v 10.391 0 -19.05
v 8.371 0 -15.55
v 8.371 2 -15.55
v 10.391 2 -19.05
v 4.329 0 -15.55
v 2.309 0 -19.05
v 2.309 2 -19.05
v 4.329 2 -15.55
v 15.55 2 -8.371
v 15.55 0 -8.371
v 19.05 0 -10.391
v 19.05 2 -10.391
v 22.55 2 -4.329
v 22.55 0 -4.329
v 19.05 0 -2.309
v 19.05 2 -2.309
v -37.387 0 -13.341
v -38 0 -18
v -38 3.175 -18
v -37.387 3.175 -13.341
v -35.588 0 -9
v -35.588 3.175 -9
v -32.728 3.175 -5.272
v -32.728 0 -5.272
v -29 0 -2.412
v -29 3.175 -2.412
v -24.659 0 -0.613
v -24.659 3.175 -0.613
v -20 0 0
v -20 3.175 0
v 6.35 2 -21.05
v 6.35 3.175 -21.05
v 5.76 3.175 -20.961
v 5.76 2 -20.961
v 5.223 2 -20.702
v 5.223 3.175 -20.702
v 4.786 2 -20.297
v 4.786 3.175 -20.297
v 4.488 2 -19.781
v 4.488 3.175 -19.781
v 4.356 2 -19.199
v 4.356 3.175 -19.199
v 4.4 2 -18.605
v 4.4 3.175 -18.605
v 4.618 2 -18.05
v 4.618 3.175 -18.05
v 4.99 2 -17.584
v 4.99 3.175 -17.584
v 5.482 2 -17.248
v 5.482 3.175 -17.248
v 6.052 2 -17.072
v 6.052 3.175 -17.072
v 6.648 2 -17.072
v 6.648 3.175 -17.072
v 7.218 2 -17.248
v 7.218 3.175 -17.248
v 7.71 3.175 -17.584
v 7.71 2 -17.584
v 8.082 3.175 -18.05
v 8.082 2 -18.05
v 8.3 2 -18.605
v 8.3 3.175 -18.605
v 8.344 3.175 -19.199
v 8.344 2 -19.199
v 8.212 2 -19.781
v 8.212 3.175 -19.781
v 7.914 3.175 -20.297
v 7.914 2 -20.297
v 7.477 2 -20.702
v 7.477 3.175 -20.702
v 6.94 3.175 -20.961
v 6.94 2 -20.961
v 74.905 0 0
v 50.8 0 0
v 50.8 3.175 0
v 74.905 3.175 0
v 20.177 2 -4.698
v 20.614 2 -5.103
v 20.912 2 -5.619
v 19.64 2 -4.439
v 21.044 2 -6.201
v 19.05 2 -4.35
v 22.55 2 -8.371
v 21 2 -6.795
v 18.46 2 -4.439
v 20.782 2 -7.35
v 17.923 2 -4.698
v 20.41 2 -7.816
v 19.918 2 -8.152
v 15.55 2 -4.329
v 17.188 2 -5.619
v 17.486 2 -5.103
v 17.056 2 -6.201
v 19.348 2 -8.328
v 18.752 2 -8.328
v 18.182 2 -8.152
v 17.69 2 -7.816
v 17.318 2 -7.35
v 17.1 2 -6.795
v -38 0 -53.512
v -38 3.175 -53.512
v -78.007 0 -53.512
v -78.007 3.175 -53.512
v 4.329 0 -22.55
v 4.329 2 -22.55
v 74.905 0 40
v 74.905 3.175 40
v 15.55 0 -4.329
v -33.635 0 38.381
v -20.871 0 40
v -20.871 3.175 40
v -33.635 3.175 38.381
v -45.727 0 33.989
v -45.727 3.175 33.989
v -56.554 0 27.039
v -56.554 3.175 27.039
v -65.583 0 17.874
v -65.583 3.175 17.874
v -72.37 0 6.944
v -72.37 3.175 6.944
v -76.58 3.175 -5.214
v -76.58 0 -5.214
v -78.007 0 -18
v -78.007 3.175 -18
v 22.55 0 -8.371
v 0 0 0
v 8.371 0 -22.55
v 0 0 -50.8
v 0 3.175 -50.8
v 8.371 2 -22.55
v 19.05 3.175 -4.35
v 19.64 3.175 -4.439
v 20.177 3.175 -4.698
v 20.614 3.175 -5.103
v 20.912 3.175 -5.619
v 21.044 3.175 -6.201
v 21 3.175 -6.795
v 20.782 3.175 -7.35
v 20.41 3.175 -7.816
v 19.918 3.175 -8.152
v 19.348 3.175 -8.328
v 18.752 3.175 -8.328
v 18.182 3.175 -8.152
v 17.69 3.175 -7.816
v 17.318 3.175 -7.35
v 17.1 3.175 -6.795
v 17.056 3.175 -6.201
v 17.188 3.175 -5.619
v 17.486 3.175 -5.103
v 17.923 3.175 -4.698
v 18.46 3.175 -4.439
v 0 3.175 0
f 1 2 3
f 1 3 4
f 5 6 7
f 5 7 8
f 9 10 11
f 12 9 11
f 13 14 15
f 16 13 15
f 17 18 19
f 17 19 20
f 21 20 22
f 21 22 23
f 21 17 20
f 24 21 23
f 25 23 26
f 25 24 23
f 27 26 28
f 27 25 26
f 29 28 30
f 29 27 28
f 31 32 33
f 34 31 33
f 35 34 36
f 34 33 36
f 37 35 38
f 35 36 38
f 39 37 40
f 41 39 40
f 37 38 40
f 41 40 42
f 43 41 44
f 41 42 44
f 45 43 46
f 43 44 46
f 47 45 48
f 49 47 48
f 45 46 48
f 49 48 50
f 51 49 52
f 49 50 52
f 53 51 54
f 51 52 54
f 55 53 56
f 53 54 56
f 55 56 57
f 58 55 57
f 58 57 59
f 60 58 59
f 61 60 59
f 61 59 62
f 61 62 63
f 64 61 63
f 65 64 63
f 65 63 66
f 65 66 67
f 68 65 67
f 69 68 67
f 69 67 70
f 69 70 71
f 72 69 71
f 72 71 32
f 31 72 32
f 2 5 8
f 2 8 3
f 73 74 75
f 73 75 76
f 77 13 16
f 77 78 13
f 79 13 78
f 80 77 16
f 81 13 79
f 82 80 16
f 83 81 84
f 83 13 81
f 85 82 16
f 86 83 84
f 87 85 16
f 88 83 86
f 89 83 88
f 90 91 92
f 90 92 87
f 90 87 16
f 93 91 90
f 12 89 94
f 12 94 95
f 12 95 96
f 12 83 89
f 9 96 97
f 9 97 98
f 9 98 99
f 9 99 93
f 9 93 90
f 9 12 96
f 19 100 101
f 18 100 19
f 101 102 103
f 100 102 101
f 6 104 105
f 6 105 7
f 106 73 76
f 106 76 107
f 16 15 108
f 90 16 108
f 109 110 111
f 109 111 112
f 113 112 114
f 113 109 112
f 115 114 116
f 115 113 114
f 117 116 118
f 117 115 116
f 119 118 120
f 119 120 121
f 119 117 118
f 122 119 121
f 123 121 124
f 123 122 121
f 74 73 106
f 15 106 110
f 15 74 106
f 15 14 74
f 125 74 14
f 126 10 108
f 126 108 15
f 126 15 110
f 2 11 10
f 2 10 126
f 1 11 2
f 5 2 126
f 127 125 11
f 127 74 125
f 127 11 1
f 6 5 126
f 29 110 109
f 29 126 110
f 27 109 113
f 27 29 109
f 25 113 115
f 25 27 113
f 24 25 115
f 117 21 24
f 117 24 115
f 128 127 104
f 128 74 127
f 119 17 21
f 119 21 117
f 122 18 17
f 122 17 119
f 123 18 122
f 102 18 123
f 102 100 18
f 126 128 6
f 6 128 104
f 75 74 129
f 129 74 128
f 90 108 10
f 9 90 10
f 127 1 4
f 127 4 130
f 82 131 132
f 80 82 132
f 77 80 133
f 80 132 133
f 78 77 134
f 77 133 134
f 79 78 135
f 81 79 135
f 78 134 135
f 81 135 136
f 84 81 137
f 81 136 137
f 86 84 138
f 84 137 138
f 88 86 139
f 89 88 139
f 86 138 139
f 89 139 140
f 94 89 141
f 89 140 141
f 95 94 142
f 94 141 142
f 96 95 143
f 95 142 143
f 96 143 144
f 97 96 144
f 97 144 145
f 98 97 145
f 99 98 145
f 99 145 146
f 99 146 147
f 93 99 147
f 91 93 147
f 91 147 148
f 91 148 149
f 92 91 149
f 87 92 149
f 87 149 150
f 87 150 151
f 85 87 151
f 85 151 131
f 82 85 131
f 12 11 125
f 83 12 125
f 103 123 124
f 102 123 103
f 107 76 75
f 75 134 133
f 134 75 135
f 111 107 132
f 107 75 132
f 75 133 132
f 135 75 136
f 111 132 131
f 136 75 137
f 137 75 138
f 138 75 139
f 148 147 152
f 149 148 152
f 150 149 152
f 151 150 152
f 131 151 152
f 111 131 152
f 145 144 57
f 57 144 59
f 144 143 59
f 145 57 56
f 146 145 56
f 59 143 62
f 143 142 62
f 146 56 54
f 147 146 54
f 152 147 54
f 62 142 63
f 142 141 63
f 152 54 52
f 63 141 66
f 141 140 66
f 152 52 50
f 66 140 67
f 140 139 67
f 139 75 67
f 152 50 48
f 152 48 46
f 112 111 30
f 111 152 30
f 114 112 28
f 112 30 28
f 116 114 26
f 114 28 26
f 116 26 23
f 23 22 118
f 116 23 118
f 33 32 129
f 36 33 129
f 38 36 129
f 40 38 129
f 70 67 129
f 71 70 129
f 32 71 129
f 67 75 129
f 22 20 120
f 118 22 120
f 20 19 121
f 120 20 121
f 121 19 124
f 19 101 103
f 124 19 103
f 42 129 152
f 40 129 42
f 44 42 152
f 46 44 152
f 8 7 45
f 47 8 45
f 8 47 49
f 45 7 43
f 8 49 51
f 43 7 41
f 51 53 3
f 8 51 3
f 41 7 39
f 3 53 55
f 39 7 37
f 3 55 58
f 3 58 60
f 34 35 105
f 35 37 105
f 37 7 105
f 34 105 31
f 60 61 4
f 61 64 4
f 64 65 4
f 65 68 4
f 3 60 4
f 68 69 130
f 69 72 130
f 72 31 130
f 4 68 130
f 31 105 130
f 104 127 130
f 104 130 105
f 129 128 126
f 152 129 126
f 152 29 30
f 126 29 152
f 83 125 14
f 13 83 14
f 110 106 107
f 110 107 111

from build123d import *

# Parameters (mm, degrees)
BOSS_EXTRUDE1_DEPTH = 3.175
SKETCH2_R           = 2
CUT_EXTRUDE1_DEPTH  = 72.912172996
CUT_EXTRUDE2_START  = -3.175
CUT_EXTRUDE2_DEPTH  = 2
BOSS_EXTRUDE2_DEPTH = 3.175


with BuildPart() as part:
    # Sketch1 → Boss-Extrude1 (new body)
    with BuildSketch(Plane(origin=(0, 0, 0), x_dir=(1, 0, 0), z_dir=(0, 1, 0))):
        Polygon((0, 0), (50.8, 0), (0, 50.8), align=None)
    extrude(amount=BOSS_EXTRUDE1_DEPTH)

    # Sketch2 → Cut-Extrude1 (cut, through all)
    with BuildSketch(Plane(origin=(0, 3.175, 0), x_dir=(1, 0, 0), z_dir=(0, 1, 0))):
        with Locations(Location((19.05, 6.35, 0), (0, 0, 270))):
            Circle(SKETCH2_R)
        with Locations(Location((6.35, 19.05, 0), (0, 0, 90))):
            Circle(SKETCH2_R)
    extrude(amount=-CUT_EXTRUDE1_DEPTH, mode=Mode.SUBTRACT)

    # Sketch3 → Cut-Extrude2 (cut)
    with BuildSketch(Plane(origin=(0, 3.175, 0), x_dir=(1, 0, 0), z_dir=(0, 1, 0)).offset(CUT_EXTRUDE2_START)):
        Polygon((8.370723055, 15.550005), (10.391446111, 19.05), (8.370723055, 22.549995), (4.329276945, 22.549995), (2.308553889, 19.05), (4.329276945, 15.550005), align=None)
        Polygon((22.549995, 4.329276945), (19.05, 2.308553889), (15.550005, 4.329276945), (15.550005, 8.370723055), (19.05, 10.391446111), (22.549995, 8.370723055), align=None)
    extrude(amount=CUT_EXTRUDE2_DEPTH, mode=Mode.SUBTRACT)

    # Sketch4 → Boss-Extrude2 (add, through all)
    with BuildSketch(Plane(origin=(0, 0, 0), x_dir=(-1, 0, 0), z_dir=(0, -1, 0))):
        with BuildLine():
            Line((0, 0), (-74.904635469, 0))
            Line((-74.904635469, 0), (-74.904635469, -40))
            Line((-74.904635469, -40), (20.871249235, -40))
            ThreePointArc((20.871249235, -40), (61.323705254, -22.707621637), (78.006543383, 18))
            Line((78.006543383, 18), (78.006543383, 53.511510239))
            Line((78.006543383, 53.511510239), (38, 53.511510239))
            Line((38, 53.511510239), (38, 18))
            ThreePointArc((38, 18), (32.727922061, 5.272077939), (20, 0))
            Line((20, 0), (0, 0))
        make_face()
    extrude(amount=-BOSS_EXTRUDE2_DEPTH)


solid = part.part
